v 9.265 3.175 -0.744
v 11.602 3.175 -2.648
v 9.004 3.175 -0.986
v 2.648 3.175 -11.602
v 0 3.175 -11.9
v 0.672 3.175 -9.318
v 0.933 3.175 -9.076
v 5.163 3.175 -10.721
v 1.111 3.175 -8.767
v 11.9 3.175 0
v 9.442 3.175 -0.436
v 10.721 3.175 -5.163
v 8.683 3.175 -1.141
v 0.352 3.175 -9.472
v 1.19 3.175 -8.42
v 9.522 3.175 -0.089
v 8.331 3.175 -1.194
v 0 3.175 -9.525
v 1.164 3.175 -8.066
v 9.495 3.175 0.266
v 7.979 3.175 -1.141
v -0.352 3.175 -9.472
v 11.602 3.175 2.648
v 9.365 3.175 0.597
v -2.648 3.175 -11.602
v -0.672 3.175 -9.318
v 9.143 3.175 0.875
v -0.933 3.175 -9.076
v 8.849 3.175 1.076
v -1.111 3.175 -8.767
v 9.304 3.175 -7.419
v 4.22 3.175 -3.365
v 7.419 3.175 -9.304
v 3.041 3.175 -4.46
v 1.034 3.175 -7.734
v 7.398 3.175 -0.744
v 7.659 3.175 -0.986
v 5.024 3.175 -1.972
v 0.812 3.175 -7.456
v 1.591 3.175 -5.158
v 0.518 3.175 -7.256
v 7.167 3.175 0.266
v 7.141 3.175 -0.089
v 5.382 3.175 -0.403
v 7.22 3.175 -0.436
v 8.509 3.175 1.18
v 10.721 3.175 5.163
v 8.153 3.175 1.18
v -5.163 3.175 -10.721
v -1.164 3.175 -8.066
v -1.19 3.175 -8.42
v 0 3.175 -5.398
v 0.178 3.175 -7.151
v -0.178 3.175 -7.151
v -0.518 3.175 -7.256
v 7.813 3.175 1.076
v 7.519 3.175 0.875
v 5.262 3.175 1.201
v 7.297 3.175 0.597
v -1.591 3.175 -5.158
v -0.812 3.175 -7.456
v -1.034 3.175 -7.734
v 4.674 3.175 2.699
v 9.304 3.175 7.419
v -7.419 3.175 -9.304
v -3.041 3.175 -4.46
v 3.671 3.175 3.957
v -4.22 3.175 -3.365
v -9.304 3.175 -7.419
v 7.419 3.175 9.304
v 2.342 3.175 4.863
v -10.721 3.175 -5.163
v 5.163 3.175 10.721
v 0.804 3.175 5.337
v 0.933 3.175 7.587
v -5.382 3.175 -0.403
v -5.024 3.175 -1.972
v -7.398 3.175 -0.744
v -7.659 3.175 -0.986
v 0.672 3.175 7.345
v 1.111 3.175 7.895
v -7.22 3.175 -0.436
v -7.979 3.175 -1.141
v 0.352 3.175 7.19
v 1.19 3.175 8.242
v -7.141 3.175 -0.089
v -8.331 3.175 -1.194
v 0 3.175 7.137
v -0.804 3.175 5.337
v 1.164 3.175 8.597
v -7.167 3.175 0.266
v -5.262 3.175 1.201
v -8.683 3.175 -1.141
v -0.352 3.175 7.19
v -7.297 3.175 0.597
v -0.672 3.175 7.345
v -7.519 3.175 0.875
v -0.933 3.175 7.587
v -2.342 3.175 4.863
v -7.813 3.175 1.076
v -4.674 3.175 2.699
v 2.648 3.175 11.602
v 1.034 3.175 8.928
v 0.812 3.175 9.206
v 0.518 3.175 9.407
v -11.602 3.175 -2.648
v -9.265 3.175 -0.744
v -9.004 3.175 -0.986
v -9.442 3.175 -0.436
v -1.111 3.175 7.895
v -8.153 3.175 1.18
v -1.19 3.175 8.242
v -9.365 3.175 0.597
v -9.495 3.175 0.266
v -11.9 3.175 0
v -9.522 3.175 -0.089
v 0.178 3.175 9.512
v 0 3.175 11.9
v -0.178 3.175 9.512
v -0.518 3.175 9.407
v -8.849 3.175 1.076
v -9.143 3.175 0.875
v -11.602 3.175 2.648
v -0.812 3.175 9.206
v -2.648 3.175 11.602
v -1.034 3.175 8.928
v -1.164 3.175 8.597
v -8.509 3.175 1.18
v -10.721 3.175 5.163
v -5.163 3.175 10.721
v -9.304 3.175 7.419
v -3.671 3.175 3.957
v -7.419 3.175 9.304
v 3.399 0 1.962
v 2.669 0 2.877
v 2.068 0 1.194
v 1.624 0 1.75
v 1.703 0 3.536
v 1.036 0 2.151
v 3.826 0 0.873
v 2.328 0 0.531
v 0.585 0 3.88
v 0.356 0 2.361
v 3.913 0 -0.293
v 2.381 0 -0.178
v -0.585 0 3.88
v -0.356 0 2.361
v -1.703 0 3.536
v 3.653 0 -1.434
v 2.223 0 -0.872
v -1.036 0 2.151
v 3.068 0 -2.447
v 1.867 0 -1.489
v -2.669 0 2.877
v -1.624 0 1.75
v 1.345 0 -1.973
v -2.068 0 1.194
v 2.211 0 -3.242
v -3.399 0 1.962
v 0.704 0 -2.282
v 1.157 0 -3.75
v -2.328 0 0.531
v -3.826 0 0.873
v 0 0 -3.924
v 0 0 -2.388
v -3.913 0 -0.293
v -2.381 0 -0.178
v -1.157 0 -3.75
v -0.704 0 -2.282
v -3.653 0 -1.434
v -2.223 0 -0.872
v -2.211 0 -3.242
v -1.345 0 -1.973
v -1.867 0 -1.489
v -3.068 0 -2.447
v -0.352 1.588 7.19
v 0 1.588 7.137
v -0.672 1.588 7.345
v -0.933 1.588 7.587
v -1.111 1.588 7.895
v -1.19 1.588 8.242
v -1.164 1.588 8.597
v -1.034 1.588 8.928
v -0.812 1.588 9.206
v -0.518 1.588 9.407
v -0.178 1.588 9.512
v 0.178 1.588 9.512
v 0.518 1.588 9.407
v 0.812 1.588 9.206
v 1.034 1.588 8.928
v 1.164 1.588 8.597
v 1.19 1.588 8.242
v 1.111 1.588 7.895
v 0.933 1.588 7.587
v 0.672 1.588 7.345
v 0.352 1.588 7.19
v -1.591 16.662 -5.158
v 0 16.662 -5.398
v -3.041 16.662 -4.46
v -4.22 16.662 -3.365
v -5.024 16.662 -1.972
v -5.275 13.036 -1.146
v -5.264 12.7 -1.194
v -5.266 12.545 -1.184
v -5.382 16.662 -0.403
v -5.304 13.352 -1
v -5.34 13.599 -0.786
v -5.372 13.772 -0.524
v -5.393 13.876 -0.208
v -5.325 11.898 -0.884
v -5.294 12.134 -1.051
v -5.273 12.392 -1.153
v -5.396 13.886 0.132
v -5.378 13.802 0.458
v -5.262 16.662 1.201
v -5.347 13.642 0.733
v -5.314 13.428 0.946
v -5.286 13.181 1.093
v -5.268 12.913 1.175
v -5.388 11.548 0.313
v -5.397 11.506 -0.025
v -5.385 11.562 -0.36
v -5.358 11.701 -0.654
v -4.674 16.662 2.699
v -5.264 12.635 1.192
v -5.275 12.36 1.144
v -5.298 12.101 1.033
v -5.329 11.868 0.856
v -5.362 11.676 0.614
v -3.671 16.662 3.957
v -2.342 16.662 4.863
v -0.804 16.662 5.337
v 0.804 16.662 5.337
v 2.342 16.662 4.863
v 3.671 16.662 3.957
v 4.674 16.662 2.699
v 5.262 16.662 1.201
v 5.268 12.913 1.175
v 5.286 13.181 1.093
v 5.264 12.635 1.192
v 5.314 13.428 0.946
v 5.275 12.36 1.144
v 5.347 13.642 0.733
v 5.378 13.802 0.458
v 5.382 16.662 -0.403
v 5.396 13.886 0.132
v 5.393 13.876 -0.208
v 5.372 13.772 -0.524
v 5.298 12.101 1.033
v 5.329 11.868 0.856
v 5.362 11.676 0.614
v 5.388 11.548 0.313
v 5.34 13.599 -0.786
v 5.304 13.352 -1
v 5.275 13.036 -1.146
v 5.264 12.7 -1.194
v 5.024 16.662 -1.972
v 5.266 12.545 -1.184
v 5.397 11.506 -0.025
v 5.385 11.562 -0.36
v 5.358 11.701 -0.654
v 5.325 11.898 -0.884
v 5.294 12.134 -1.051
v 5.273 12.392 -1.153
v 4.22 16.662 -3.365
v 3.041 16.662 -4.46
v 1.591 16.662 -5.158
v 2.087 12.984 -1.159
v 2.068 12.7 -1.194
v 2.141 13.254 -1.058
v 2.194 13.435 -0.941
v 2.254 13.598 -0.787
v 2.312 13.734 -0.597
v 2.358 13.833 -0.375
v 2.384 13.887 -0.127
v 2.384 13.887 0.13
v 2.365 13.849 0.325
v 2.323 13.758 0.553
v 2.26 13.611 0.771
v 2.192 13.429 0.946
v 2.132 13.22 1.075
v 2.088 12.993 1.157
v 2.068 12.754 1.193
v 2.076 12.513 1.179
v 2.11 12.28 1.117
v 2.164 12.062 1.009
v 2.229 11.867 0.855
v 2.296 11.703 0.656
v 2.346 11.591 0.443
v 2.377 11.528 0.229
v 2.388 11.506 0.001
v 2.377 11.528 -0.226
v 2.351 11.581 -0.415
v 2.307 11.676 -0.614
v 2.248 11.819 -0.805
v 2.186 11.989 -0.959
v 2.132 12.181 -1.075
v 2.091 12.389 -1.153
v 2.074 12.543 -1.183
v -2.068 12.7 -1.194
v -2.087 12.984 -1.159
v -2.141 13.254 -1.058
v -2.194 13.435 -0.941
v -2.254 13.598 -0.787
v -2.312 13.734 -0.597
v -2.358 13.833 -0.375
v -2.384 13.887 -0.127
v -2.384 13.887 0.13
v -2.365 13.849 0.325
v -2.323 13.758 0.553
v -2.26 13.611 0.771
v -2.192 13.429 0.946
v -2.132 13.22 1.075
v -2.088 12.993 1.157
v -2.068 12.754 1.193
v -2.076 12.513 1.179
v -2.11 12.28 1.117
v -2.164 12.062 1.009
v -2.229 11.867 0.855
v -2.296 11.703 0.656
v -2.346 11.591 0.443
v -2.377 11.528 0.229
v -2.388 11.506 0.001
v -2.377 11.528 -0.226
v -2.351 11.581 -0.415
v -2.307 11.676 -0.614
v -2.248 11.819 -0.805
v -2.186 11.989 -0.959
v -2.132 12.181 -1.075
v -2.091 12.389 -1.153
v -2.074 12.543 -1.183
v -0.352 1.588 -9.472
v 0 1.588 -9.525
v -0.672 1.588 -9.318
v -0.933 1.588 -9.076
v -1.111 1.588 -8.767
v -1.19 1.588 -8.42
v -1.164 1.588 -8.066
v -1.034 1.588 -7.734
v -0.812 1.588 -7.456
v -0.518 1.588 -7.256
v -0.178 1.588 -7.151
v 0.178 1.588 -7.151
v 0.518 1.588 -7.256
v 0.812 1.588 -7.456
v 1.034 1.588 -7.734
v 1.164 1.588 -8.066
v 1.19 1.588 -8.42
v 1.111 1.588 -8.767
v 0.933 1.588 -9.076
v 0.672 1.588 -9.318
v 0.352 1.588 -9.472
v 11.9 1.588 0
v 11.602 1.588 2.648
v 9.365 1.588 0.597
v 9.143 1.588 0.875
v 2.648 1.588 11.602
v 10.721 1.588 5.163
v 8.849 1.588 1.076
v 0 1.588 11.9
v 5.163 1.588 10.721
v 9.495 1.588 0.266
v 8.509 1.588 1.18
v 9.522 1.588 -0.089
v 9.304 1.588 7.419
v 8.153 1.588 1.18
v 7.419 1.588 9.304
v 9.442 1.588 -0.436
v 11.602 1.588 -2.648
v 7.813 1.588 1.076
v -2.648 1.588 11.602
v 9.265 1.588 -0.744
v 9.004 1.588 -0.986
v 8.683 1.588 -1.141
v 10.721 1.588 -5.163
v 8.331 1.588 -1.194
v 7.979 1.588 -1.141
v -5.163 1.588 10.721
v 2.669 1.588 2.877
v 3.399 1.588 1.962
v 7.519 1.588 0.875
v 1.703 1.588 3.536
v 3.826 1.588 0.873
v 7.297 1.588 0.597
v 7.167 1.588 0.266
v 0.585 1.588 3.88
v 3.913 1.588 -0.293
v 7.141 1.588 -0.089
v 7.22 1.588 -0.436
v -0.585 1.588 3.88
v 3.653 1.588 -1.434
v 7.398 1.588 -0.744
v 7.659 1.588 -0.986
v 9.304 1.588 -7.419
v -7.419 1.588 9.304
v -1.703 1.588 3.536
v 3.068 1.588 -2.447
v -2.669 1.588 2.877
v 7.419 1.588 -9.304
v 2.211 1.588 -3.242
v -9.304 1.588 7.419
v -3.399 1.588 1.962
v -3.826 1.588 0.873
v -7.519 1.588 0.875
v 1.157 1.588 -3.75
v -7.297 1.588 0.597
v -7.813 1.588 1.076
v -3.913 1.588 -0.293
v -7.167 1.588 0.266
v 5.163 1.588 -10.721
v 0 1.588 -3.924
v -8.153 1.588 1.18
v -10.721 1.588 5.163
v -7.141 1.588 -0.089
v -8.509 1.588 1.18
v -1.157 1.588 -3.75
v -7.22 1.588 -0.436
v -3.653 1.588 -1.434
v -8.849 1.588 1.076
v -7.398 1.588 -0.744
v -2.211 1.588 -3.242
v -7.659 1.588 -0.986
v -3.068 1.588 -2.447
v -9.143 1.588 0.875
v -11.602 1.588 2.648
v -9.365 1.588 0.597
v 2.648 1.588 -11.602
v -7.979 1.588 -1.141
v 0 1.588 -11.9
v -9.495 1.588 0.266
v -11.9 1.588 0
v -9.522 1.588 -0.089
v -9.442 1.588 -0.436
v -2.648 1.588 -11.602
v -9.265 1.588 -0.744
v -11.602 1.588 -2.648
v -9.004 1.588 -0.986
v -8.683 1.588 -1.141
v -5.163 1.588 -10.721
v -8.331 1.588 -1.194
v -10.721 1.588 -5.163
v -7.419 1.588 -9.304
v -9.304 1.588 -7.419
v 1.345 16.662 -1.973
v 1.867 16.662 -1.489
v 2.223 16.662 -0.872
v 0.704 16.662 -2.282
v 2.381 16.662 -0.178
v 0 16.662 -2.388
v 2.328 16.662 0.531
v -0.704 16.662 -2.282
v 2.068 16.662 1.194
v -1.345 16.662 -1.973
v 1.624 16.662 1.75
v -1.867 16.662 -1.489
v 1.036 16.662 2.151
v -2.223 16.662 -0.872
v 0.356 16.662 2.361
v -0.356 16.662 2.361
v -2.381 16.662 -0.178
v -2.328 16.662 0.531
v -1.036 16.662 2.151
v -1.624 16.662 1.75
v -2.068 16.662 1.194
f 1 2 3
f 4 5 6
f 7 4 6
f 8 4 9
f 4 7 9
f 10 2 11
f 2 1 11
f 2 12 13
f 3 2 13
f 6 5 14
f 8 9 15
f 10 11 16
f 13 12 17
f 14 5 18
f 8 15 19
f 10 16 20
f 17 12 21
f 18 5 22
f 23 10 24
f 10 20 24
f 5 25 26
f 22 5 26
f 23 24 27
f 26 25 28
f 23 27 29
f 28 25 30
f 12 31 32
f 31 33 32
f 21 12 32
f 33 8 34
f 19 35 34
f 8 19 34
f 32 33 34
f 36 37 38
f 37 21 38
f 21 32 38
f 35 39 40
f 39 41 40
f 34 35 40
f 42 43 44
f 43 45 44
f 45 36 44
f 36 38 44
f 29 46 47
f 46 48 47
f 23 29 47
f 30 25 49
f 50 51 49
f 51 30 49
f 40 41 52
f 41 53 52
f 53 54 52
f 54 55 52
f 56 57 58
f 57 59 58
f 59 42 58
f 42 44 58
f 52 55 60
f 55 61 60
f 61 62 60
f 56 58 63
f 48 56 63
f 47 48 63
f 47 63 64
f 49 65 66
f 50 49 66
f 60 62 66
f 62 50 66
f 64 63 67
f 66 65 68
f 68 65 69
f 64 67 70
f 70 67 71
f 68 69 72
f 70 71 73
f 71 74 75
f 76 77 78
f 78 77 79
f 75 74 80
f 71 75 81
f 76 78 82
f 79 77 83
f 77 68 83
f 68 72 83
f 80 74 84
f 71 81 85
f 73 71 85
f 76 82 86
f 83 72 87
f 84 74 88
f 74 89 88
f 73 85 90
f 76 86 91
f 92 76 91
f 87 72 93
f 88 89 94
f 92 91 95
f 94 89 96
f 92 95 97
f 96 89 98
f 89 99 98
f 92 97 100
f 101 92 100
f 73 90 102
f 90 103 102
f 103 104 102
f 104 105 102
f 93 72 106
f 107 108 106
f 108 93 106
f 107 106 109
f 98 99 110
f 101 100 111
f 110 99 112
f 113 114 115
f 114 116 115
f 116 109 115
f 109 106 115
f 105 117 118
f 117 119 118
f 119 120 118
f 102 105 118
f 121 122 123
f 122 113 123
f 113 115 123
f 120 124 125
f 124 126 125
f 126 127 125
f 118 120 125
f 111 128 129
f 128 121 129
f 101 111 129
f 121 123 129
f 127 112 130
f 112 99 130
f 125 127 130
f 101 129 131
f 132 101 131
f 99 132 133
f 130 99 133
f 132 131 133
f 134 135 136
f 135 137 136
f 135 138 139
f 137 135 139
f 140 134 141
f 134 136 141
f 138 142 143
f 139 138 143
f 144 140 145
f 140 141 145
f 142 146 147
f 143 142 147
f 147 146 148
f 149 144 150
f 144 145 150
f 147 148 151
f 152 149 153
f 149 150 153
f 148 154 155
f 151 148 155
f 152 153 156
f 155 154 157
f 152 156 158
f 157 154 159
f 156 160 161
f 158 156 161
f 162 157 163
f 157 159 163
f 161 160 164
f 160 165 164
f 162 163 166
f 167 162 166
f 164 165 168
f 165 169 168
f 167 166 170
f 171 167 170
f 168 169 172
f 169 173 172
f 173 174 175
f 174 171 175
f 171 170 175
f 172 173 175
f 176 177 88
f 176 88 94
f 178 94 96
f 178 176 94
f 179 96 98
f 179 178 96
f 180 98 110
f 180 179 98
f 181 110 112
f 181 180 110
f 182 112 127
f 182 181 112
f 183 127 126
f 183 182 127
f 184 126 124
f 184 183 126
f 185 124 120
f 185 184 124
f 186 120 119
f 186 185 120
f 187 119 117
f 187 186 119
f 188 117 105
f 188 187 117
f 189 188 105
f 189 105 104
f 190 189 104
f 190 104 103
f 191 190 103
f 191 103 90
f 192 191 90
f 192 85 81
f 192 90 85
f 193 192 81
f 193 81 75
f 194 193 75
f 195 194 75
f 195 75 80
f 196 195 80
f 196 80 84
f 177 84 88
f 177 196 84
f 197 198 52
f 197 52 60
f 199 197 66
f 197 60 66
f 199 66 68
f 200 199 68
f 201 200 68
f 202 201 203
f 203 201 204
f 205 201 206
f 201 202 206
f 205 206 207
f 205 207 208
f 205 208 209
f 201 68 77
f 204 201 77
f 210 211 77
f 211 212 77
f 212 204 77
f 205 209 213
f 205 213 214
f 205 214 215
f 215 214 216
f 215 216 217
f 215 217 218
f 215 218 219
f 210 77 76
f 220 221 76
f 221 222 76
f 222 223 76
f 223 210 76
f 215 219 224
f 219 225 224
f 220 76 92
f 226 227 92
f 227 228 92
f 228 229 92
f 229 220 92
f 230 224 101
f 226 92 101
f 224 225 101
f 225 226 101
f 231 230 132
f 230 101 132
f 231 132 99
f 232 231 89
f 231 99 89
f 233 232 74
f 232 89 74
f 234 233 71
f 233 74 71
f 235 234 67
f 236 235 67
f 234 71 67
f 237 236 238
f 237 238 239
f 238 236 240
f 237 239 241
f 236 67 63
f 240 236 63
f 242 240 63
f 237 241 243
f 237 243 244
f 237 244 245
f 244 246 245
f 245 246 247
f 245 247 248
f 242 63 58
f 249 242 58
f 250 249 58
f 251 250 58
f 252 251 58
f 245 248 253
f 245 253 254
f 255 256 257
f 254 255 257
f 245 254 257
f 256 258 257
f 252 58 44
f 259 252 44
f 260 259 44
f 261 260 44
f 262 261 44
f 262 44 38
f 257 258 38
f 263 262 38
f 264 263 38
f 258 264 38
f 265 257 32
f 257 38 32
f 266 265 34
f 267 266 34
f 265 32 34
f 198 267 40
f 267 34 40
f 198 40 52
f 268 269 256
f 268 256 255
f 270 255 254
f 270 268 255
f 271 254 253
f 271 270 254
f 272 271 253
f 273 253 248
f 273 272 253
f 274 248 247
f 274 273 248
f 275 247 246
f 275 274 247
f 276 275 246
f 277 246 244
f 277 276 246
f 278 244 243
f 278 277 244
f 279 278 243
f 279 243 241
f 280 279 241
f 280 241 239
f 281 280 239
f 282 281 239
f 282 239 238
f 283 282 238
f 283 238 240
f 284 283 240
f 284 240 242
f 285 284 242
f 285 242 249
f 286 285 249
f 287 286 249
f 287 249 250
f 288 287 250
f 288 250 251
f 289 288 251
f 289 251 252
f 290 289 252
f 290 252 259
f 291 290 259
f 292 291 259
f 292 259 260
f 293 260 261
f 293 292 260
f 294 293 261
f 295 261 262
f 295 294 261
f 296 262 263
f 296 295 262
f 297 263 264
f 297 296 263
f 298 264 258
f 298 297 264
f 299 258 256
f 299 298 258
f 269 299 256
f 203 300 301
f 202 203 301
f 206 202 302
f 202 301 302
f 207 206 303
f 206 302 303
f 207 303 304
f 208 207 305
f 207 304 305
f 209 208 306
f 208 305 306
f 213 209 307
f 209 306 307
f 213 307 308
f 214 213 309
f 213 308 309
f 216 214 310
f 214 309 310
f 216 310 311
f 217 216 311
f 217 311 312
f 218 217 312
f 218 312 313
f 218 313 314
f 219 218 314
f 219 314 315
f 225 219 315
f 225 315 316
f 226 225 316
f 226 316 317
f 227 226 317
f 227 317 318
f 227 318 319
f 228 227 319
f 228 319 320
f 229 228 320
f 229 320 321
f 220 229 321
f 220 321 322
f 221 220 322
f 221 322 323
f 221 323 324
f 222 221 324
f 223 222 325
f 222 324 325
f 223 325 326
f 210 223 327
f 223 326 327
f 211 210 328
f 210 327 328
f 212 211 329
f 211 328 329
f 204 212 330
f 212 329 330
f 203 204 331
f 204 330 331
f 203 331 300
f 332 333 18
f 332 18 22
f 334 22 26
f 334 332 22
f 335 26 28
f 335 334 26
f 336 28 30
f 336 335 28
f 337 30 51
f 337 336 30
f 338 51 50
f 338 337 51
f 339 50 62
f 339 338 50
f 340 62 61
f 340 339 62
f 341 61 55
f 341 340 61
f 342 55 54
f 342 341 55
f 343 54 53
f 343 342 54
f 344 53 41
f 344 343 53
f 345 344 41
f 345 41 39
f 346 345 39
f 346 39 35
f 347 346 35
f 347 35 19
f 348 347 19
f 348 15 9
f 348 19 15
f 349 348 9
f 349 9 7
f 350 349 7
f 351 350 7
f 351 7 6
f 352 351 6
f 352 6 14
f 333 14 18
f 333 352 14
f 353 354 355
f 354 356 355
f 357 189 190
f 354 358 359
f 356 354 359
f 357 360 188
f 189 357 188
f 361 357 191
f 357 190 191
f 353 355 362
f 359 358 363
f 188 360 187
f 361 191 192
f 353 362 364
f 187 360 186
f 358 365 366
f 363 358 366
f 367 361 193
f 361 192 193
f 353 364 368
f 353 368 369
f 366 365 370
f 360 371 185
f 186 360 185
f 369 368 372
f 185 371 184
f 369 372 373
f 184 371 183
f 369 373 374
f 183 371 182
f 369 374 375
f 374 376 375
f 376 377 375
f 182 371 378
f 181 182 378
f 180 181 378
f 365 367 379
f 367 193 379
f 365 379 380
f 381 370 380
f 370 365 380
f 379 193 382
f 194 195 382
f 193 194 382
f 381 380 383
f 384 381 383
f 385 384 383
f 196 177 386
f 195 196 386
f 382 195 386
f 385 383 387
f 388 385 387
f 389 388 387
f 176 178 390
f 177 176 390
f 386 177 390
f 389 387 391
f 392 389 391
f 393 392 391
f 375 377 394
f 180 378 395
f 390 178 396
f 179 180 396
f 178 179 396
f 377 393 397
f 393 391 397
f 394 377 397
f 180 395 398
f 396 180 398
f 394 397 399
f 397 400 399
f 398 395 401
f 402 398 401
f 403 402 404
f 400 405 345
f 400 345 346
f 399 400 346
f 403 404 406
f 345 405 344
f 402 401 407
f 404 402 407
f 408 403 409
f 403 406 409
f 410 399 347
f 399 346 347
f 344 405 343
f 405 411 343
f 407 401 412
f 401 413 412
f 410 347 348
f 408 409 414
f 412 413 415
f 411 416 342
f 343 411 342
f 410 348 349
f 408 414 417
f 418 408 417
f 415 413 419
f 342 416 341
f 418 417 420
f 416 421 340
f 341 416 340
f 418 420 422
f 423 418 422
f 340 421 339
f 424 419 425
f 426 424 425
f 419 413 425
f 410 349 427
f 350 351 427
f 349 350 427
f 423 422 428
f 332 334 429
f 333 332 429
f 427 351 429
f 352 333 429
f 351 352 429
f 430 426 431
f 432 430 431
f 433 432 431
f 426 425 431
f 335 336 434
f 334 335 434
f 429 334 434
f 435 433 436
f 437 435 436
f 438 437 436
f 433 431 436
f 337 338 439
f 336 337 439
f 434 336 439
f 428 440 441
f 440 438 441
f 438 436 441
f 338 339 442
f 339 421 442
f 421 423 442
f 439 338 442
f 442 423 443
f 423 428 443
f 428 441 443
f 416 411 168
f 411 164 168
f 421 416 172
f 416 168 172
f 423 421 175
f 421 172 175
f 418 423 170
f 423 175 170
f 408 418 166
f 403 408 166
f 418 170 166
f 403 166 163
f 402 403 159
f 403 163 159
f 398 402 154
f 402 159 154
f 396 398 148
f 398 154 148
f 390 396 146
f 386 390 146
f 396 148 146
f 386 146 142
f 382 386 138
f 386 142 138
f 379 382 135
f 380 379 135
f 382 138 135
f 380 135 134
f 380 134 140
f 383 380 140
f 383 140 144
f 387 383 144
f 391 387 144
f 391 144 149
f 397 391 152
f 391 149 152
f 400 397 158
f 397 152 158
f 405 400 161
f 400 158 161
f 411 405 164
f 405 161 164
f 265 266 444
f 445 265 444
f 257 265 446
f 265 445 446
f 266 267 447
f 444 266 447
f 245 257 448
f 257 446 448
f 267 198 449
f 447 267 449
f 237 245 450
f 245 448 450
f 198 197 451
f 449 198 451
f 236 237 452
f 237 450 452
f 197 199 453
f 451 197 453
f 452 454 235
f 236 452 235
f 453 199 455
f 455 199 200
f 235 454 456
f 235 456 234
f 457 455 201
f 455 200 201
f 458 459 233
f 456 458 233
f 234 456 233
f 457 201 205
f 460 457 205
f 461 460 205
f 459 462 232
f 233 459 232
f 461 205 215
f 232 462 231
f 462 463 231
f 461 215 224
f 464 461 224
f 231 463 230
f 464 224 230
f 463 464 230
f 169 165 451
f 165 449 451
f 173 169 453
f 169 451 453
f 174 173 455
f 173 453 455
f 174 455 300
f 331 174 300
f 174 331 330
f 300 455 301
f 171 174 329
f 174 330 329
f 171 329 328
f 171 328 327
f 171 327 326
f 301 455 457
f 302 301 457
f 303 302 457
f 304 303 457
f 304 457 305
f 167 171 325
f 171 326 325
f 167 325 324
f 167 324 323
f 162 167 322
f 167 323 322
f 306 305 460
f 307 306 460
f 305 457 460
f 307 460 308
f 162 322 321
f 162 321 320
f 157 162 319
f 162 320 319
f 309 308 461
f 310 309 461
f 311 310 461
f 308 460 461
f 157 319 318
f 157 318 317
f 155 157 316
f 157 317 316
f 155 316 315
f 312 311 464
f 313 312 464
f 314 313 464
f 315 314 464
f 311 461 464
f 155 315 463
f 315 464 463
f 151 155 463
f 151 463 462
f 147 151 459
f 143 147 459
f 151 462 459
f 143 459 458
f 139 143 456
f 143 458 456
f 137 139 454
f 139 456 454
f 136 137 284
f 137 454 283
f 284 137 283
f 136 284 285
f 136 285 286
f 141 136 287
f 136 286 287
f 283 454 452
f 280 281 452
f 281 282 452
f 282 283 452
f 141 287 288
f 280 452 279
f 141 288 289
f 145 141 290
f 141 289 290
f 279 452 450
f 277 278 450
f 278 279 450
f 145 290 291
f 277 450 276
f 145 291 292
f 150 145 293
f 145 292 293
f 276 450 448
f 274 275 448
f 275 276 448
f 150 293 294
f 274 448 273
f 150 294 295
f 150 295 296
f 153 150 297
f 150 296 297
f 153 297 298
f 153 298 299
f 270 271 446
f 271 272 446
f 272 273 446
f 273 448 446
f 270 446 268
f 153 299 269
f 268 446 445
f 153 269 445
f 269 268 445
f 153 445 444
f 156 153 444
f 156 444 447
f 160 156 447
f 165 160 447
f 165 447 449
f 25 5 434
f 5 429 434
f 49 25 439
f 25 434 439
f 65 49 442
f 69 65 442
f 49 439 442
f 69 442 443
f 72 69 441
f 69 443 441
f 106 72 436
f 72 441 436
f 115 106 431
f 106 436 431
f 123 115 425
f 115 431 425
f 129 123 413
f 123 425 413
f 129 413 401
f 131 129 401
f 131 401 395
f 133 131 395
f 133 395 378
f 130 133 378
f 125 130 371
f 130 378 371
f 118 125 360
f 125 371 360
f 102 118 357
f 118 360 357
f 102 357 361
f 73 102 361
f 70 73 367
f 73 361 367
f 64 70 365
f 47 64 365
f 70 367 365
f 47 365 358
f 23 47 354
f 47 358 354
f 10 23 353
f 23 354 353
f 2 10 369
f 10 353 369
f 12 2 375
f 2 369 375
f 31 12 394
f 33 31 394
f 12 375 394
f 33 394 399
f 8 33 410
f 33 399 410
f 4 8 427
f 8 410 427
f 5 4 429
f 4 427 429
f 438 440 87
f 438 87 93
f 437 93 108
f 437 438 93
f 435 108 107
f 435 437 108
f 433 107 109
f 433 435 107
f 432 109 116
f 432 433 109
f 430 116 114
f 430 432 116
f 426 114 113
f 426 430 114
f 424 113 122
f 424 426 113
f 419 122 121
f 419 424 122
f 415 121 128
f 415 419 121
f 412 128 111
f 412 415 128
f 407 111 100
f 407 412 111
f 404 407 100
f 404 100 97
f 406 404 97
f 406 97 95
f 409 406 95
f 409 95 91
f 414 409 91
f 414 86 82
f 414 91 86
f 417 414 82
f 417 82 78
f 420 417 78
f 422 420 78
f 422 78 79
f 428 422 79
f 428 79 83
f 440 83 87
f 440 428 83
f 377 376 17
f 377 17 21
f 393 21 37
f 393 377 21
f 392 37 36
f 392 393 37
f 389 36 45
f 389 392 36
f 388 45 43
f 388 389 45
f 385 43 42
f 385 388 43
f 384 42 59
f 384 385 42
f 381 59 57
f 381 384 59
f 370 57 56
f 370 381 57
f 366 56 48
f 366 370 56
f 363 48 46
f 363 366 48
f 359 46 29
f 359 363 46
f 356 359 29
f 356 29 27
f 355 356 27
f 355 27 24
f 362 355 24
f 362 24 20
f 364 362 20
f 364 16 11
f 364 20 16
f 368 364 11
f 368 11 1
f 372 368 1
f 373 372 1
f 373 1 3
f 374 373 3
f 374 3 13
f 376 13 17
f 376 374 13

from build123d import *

# Parameters (mm, degrees)
SKETCH1_5_R             = 1.1938
CUT_EXTRUDE1_DEPTH      = 12.8999
CUT_EXTRUDE1_DEPTH_BACK = 12.8999
SKETCH2_R               = 1.1938
CUT_EXTRUDE2_DEPTH      = 17.6624001


with BuildPart() as part:
    # Sketch1 → Revolve1 (revolve)
    with BuildSketch(Plane(origin=(0, 0, 0), x_dir=(0, 0, -1), z_dir=(1, 0, 0))):
        Polygon((3.9243, 0), (2.3876, 0), (2.3876, 16.6624), (5.3975, 16.6624), (5.3975, 3.175), (11.8999, 3.175), (11.8999, 1.5875), (3.9243, 1.5875), align=None)
    revolve(axis=Axis((0, 0, 0), (0, 1, 0)))

    # Sketch1_5 → Cut-Extrude1 (cut, two sides)
    with BuildSketch(Plane(origin=(0, 0, 0), x_dir=(0, 0, -1), z_dir=(1, 0, 0))) as cut_extrude1_sk:
        with Locations((0, 12.7)):
            Circle(SKETCH1_5_R)
    extrude(amount=CUT_EXTRUDE1_DEPTH, mode=Mode.SUBTRACT)
    extrude(cut_extrude1_sk.sketch, amount=-CUT_EXTRUDE1_DEPTH_BACK, mode=Mode.SUBTRACT)

    # Sketch2 → Cut-Extrude2 (cut, through all)
    with BuildSketch(Plane(origin=(0, 0, 0), x_dir=(1, 0, 0), z_dir=(0, 1, 0))):
        with Locations(Location((-8.3312, 0, 0), (0, 0, 90))):  # turned: the seam where the file's is
            Circle(SKETCH2_R)
        with Locations(Location((0, 8.3312, 0), (0, 0, 90))):  # turned: the seam where the file's is
            Circle(SKETCH2_R)
        with Locations(Location((0, -8.3312, 0), (0, 0, 90))):  # turned: the seam where the file's is
            Circle(SKETCH2_R)
        with Locations(Location((8.3312, 0, 0), (0, 0, 90))):  # turned: the seam where the file's is
            Circle(SKETCH2_R)
    extrude(amount=CUT_EXTRUDE2_DEPTH, mode=Mode.SUBTRACT)


solid = part.part
